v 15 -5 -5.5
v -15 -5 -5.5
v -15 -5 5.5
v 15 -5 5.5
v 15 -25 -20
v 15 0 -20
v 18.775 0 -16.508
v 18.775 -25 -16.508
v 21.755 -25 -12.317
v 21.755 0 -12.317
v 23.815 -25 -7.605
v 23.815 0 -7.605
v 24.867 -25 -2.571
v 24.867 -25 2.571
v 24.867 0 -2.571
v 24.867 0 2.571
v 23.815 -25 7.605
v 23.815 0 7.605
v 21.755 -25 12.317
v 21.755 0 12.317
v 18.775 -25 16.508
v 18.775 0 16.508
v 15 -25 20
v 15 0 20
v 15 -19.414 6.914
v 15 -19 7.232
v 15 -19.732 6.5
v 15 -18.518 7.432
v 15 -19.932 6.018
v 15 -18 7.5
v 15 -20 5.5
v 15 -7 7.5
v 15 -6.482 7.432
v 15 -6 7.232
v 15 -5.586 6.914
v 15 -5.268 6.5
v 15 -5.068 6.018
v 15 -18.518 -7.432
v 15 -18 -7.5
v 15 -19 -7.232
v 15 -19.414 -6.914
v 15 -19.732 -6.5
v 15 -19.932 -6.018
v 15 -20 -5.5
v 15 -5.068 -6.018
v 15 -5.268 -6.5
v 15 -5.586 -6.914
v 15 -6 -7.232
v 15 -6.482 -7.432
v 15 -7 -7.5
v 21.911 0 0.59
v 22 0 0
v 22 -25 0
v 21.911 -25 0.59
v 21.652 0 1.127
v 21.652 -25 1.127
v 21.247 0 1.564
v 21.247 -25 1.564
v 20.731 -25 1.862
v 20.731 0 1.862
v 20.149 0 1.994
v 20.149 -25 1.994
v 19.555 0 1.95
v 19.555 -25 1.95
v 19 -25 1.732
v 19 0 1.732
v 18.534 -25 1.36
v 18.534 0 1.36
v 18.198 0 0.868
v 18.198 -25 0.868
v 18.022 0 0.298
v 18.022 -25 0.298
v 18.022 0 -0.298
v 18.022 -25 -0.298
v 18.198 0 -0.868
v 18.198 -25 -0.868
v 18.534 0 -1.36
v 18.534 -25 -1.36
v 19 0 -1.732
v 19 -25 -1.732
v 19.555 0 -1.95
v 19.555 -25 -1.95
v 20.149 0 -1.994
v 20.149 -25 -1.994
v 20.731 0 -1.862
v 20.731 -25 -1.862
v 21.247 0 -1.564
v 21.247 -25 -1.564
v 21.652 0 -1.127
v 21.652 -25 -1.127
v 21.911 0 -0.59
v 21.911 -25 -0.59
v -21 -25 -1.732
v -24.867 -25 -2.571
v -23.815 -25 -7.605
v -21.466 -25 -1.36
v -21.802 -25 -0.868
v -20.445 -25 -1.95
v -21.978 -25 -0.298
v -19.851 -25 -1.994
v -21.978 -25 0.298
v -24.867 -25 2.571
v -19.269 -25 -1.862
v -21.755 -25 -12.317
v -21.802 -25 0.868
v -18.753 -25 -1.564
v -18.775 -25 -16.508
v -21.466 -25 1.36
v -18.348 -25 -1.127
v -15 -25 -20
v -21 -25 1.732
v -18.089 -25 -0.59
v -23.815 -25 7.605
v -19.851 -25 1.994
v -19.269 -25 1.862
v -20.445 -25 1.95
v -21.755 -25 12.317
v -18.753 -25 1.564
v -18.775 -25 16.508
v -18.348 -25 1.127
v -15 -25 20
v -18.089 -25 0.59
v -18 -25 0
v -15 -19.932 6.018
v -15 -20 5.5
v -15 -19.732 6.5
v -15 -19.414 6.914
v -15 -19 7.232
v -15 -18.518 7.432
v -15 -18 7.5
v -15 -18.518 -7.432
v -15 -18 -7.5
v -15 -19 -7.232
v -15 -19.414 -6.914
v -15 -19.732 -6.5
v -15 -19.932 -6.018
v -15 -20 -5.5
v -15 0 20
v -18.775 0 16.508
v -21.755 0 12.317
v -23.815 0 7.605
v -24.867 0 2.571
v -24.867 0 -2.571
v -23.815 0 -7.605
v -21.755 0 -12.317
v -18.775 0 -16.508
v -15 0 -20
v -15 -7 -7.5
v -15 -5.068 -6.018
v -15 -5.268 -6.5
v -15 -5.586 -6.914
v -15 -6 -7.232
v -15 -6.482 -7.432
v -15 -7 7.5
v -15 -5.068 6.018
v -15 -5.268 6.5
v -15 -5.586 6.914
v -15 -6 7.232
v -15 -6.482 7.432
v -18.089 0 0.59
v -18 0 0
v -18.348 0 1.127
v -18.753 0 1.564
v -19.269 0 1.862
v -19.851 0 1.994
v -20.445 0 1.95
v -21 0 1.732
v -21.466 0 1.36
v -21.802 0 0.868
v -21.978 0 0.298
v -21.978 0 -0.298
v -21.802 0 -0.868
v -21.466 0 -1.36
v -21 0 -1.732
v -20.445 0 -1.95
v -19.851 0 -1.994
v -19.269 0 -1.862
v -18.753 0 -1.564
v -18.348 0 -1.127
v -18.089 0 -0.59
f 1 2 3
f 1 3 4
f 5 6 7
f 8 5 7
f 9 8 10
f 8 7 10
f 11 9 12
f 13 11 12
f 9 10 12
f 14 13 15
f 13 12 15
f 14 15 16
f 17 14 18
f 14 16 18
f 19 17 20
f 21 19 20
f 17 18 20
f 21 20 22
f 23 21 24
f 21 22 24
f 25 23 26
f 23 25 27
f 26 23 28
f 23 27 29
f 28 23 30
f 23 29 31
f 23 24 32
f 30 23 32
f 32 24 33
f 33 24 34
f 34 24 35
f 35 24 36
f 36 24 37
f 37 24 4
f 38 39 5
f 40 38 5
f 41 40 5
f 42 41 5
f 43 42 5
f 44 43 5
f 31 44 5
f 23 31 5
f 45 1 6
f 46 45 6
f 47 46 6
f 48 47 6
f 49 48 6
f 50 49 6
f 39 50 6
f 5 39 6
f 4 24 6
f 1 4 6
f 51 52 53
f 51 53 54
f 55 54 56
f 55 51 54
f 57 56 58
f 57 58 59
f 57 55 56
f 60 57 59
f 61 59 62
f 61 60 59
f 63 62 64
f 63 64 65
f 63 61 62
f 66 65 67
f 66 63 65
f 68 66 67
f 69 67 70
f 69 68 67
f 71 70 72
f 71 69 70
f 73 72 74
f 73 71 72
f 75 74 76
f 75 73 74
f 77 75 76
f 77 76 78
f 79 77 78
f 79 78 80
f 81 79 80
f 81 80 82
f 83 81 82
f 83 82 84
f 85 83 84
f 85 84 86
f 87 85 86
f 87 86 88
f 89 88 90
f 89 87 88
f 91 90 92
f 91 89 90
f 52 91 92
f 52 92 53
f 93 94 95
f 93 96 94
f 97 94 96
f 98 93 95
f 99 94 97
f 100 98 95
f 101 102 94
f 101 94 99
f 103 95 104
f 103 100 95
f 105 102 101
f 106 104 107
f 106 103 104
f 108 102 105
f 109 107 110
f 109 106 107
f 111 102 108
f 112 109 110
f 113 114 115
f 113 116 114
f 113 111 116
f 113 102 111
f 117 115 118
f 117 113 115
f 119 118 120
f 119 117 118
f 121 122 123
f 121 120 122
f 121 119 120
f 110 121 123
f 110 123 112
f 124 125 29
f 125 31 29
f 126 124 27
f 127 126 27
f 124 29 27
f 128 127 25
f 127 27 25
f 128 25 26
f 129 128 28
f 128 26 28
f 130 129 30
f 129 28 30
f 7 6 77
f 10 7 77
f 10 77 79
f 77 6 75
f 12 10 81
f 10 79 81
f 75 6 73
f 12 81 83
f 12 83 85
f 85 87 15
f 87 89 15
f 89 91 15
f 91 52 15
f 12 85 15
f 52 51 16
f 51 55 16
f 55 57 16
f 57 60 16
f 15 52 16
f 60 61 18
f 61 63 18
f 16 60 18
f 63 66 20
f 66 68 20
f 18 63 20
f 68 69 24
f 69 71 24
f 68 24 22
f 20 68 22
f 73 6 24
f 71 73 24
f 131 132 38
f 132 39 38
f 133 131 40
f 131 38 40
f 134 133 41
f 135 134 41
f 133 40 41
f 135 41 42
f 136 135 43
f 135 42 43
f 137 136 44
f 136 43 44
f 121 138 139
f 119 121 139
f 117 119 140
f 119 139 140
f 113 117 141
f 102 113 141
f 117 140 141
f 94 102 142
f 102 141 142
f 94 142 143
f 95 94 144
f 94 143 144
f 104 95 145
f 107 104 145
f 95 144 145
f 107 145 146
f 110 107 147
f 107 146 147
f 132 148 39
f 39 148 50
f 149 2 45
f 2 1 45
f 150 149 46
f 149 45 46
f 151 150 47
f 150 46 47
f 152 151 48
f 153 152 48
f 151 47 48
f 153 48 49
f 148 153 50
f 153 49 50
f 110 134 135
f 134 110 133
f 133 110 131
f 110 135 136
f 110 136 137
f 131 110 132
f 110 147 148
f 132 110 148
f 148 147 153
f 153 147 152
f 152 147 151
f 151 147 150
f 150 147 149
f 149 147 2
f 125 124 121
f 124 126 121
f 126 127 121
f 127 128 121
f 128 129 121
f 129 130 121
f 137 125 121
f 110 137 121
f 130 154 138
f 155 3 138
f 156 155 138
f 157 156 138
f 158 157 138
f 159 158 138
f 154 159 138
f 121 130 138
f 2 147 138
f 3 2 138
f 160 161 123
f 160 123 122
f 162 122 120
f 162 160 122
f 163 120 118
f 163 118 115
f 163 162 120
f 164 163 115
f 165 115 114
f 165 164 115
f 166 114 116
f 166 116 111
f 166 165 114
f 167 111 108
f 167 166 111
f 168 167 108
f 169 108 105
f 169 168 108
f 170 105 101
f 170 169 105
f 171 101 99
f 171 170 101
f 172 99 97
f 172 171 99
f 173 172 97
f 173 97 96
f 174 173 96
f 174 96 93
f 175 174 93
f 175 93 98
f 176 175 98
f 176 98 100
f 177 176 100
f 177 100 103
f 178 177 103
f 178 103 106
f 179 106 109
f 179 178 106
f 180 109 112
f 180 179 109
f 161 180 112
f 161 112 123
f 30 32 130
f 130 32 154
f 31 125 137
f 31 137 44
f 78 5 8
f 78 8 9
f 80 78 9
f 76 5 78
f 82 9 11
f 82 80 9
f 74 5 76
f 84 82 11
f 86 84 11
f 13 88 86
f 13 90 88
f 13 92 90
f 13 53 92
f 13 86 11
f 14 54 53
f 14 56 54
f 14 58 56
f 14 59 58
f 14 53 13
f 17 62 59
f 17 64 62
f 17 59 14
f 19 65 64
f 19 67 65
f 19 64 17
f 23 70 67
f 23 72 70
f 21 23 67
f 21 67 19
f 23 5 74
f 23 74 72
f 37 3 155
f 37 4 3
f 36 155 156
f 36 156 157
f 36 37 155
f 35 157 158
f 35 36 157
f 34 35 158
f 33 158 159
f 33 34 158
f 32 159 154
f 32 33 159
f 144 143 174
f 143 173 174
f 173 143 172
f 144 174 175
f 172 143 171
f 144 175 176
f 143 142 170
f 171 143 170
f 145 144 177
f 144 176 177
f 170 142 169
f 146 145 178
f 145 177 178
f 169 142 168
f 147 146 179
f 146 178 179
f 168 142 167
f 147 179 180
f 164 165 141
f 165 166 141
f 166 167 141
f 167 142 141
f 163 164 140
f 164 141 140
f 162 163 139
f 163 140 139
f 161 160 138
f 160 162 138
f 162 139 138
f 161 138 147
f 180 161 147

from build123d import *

# Parameters (mm, degrees)
F0_R          = 2
F1_DEPTH      = 25
F2_W          = 30
F2_H          = 12.4809114001
F3_DEPTH      = 25
F3_DEPTH_BACK = 25
F4_R          = 2


with BuildPart() as f1:
    # F0 (on Front) → F1 (new body)
    with BuildSketch(Plane.XZ):
        with BuildLine():
            Line((-15, 7.5), (-15, 20))
            ThreePointArc((-15, 20), (-25, 0), (-15, -20))
            Line((-15, -20), (-15, -7.5))
            Line((-15, -7.5), (15, -7.5))
            Line((15, -7.5), (15, -20))
            ThreePointArc((15, -20), (25, 0), (15, 20))
            Line((15, 20), (15, 7.5))
            Line((15, 7.5), (-15, 7.5))
        make_face()
        with Locations((-20, 0)):
            Circle(F0_R, mode=Mode.SUBTRACT)
        with Locations((20, 0)):
            Circle(F0_R, mode=Mode.SUBTRACT)
    extrude(amount=F1_DEPTH)

    # F2 (on Top) → F3 (cut, two sides)
    with BuildSketch(Plane.XY) as f3_sk:
        with Locations((0, 1.2404557001)):
            Rectangle(F2_W, F2_H)
        with Locations((0, -26.2404557001)):
            Rectangle(F2_W, F2_H)
    extrude(amount=-F3_DEPTH, mode=Mode.SUBTRACT)
    extrude(f3_sk.sketch, amount=F3_DEPTH_BACK, mode=Mode.SUBTRACT)

    # F4
    f4_edges = [f1.edges().sort_by_distance(p)[0] for p in [
        (0, -20, 7.5),
        (0, -20, -7.5),
        (0, -5, -7.5),
        (0, -5, 7.5),
    ]]
    fillet(f4_edges, radius=F4_R)


solid = f1.part
